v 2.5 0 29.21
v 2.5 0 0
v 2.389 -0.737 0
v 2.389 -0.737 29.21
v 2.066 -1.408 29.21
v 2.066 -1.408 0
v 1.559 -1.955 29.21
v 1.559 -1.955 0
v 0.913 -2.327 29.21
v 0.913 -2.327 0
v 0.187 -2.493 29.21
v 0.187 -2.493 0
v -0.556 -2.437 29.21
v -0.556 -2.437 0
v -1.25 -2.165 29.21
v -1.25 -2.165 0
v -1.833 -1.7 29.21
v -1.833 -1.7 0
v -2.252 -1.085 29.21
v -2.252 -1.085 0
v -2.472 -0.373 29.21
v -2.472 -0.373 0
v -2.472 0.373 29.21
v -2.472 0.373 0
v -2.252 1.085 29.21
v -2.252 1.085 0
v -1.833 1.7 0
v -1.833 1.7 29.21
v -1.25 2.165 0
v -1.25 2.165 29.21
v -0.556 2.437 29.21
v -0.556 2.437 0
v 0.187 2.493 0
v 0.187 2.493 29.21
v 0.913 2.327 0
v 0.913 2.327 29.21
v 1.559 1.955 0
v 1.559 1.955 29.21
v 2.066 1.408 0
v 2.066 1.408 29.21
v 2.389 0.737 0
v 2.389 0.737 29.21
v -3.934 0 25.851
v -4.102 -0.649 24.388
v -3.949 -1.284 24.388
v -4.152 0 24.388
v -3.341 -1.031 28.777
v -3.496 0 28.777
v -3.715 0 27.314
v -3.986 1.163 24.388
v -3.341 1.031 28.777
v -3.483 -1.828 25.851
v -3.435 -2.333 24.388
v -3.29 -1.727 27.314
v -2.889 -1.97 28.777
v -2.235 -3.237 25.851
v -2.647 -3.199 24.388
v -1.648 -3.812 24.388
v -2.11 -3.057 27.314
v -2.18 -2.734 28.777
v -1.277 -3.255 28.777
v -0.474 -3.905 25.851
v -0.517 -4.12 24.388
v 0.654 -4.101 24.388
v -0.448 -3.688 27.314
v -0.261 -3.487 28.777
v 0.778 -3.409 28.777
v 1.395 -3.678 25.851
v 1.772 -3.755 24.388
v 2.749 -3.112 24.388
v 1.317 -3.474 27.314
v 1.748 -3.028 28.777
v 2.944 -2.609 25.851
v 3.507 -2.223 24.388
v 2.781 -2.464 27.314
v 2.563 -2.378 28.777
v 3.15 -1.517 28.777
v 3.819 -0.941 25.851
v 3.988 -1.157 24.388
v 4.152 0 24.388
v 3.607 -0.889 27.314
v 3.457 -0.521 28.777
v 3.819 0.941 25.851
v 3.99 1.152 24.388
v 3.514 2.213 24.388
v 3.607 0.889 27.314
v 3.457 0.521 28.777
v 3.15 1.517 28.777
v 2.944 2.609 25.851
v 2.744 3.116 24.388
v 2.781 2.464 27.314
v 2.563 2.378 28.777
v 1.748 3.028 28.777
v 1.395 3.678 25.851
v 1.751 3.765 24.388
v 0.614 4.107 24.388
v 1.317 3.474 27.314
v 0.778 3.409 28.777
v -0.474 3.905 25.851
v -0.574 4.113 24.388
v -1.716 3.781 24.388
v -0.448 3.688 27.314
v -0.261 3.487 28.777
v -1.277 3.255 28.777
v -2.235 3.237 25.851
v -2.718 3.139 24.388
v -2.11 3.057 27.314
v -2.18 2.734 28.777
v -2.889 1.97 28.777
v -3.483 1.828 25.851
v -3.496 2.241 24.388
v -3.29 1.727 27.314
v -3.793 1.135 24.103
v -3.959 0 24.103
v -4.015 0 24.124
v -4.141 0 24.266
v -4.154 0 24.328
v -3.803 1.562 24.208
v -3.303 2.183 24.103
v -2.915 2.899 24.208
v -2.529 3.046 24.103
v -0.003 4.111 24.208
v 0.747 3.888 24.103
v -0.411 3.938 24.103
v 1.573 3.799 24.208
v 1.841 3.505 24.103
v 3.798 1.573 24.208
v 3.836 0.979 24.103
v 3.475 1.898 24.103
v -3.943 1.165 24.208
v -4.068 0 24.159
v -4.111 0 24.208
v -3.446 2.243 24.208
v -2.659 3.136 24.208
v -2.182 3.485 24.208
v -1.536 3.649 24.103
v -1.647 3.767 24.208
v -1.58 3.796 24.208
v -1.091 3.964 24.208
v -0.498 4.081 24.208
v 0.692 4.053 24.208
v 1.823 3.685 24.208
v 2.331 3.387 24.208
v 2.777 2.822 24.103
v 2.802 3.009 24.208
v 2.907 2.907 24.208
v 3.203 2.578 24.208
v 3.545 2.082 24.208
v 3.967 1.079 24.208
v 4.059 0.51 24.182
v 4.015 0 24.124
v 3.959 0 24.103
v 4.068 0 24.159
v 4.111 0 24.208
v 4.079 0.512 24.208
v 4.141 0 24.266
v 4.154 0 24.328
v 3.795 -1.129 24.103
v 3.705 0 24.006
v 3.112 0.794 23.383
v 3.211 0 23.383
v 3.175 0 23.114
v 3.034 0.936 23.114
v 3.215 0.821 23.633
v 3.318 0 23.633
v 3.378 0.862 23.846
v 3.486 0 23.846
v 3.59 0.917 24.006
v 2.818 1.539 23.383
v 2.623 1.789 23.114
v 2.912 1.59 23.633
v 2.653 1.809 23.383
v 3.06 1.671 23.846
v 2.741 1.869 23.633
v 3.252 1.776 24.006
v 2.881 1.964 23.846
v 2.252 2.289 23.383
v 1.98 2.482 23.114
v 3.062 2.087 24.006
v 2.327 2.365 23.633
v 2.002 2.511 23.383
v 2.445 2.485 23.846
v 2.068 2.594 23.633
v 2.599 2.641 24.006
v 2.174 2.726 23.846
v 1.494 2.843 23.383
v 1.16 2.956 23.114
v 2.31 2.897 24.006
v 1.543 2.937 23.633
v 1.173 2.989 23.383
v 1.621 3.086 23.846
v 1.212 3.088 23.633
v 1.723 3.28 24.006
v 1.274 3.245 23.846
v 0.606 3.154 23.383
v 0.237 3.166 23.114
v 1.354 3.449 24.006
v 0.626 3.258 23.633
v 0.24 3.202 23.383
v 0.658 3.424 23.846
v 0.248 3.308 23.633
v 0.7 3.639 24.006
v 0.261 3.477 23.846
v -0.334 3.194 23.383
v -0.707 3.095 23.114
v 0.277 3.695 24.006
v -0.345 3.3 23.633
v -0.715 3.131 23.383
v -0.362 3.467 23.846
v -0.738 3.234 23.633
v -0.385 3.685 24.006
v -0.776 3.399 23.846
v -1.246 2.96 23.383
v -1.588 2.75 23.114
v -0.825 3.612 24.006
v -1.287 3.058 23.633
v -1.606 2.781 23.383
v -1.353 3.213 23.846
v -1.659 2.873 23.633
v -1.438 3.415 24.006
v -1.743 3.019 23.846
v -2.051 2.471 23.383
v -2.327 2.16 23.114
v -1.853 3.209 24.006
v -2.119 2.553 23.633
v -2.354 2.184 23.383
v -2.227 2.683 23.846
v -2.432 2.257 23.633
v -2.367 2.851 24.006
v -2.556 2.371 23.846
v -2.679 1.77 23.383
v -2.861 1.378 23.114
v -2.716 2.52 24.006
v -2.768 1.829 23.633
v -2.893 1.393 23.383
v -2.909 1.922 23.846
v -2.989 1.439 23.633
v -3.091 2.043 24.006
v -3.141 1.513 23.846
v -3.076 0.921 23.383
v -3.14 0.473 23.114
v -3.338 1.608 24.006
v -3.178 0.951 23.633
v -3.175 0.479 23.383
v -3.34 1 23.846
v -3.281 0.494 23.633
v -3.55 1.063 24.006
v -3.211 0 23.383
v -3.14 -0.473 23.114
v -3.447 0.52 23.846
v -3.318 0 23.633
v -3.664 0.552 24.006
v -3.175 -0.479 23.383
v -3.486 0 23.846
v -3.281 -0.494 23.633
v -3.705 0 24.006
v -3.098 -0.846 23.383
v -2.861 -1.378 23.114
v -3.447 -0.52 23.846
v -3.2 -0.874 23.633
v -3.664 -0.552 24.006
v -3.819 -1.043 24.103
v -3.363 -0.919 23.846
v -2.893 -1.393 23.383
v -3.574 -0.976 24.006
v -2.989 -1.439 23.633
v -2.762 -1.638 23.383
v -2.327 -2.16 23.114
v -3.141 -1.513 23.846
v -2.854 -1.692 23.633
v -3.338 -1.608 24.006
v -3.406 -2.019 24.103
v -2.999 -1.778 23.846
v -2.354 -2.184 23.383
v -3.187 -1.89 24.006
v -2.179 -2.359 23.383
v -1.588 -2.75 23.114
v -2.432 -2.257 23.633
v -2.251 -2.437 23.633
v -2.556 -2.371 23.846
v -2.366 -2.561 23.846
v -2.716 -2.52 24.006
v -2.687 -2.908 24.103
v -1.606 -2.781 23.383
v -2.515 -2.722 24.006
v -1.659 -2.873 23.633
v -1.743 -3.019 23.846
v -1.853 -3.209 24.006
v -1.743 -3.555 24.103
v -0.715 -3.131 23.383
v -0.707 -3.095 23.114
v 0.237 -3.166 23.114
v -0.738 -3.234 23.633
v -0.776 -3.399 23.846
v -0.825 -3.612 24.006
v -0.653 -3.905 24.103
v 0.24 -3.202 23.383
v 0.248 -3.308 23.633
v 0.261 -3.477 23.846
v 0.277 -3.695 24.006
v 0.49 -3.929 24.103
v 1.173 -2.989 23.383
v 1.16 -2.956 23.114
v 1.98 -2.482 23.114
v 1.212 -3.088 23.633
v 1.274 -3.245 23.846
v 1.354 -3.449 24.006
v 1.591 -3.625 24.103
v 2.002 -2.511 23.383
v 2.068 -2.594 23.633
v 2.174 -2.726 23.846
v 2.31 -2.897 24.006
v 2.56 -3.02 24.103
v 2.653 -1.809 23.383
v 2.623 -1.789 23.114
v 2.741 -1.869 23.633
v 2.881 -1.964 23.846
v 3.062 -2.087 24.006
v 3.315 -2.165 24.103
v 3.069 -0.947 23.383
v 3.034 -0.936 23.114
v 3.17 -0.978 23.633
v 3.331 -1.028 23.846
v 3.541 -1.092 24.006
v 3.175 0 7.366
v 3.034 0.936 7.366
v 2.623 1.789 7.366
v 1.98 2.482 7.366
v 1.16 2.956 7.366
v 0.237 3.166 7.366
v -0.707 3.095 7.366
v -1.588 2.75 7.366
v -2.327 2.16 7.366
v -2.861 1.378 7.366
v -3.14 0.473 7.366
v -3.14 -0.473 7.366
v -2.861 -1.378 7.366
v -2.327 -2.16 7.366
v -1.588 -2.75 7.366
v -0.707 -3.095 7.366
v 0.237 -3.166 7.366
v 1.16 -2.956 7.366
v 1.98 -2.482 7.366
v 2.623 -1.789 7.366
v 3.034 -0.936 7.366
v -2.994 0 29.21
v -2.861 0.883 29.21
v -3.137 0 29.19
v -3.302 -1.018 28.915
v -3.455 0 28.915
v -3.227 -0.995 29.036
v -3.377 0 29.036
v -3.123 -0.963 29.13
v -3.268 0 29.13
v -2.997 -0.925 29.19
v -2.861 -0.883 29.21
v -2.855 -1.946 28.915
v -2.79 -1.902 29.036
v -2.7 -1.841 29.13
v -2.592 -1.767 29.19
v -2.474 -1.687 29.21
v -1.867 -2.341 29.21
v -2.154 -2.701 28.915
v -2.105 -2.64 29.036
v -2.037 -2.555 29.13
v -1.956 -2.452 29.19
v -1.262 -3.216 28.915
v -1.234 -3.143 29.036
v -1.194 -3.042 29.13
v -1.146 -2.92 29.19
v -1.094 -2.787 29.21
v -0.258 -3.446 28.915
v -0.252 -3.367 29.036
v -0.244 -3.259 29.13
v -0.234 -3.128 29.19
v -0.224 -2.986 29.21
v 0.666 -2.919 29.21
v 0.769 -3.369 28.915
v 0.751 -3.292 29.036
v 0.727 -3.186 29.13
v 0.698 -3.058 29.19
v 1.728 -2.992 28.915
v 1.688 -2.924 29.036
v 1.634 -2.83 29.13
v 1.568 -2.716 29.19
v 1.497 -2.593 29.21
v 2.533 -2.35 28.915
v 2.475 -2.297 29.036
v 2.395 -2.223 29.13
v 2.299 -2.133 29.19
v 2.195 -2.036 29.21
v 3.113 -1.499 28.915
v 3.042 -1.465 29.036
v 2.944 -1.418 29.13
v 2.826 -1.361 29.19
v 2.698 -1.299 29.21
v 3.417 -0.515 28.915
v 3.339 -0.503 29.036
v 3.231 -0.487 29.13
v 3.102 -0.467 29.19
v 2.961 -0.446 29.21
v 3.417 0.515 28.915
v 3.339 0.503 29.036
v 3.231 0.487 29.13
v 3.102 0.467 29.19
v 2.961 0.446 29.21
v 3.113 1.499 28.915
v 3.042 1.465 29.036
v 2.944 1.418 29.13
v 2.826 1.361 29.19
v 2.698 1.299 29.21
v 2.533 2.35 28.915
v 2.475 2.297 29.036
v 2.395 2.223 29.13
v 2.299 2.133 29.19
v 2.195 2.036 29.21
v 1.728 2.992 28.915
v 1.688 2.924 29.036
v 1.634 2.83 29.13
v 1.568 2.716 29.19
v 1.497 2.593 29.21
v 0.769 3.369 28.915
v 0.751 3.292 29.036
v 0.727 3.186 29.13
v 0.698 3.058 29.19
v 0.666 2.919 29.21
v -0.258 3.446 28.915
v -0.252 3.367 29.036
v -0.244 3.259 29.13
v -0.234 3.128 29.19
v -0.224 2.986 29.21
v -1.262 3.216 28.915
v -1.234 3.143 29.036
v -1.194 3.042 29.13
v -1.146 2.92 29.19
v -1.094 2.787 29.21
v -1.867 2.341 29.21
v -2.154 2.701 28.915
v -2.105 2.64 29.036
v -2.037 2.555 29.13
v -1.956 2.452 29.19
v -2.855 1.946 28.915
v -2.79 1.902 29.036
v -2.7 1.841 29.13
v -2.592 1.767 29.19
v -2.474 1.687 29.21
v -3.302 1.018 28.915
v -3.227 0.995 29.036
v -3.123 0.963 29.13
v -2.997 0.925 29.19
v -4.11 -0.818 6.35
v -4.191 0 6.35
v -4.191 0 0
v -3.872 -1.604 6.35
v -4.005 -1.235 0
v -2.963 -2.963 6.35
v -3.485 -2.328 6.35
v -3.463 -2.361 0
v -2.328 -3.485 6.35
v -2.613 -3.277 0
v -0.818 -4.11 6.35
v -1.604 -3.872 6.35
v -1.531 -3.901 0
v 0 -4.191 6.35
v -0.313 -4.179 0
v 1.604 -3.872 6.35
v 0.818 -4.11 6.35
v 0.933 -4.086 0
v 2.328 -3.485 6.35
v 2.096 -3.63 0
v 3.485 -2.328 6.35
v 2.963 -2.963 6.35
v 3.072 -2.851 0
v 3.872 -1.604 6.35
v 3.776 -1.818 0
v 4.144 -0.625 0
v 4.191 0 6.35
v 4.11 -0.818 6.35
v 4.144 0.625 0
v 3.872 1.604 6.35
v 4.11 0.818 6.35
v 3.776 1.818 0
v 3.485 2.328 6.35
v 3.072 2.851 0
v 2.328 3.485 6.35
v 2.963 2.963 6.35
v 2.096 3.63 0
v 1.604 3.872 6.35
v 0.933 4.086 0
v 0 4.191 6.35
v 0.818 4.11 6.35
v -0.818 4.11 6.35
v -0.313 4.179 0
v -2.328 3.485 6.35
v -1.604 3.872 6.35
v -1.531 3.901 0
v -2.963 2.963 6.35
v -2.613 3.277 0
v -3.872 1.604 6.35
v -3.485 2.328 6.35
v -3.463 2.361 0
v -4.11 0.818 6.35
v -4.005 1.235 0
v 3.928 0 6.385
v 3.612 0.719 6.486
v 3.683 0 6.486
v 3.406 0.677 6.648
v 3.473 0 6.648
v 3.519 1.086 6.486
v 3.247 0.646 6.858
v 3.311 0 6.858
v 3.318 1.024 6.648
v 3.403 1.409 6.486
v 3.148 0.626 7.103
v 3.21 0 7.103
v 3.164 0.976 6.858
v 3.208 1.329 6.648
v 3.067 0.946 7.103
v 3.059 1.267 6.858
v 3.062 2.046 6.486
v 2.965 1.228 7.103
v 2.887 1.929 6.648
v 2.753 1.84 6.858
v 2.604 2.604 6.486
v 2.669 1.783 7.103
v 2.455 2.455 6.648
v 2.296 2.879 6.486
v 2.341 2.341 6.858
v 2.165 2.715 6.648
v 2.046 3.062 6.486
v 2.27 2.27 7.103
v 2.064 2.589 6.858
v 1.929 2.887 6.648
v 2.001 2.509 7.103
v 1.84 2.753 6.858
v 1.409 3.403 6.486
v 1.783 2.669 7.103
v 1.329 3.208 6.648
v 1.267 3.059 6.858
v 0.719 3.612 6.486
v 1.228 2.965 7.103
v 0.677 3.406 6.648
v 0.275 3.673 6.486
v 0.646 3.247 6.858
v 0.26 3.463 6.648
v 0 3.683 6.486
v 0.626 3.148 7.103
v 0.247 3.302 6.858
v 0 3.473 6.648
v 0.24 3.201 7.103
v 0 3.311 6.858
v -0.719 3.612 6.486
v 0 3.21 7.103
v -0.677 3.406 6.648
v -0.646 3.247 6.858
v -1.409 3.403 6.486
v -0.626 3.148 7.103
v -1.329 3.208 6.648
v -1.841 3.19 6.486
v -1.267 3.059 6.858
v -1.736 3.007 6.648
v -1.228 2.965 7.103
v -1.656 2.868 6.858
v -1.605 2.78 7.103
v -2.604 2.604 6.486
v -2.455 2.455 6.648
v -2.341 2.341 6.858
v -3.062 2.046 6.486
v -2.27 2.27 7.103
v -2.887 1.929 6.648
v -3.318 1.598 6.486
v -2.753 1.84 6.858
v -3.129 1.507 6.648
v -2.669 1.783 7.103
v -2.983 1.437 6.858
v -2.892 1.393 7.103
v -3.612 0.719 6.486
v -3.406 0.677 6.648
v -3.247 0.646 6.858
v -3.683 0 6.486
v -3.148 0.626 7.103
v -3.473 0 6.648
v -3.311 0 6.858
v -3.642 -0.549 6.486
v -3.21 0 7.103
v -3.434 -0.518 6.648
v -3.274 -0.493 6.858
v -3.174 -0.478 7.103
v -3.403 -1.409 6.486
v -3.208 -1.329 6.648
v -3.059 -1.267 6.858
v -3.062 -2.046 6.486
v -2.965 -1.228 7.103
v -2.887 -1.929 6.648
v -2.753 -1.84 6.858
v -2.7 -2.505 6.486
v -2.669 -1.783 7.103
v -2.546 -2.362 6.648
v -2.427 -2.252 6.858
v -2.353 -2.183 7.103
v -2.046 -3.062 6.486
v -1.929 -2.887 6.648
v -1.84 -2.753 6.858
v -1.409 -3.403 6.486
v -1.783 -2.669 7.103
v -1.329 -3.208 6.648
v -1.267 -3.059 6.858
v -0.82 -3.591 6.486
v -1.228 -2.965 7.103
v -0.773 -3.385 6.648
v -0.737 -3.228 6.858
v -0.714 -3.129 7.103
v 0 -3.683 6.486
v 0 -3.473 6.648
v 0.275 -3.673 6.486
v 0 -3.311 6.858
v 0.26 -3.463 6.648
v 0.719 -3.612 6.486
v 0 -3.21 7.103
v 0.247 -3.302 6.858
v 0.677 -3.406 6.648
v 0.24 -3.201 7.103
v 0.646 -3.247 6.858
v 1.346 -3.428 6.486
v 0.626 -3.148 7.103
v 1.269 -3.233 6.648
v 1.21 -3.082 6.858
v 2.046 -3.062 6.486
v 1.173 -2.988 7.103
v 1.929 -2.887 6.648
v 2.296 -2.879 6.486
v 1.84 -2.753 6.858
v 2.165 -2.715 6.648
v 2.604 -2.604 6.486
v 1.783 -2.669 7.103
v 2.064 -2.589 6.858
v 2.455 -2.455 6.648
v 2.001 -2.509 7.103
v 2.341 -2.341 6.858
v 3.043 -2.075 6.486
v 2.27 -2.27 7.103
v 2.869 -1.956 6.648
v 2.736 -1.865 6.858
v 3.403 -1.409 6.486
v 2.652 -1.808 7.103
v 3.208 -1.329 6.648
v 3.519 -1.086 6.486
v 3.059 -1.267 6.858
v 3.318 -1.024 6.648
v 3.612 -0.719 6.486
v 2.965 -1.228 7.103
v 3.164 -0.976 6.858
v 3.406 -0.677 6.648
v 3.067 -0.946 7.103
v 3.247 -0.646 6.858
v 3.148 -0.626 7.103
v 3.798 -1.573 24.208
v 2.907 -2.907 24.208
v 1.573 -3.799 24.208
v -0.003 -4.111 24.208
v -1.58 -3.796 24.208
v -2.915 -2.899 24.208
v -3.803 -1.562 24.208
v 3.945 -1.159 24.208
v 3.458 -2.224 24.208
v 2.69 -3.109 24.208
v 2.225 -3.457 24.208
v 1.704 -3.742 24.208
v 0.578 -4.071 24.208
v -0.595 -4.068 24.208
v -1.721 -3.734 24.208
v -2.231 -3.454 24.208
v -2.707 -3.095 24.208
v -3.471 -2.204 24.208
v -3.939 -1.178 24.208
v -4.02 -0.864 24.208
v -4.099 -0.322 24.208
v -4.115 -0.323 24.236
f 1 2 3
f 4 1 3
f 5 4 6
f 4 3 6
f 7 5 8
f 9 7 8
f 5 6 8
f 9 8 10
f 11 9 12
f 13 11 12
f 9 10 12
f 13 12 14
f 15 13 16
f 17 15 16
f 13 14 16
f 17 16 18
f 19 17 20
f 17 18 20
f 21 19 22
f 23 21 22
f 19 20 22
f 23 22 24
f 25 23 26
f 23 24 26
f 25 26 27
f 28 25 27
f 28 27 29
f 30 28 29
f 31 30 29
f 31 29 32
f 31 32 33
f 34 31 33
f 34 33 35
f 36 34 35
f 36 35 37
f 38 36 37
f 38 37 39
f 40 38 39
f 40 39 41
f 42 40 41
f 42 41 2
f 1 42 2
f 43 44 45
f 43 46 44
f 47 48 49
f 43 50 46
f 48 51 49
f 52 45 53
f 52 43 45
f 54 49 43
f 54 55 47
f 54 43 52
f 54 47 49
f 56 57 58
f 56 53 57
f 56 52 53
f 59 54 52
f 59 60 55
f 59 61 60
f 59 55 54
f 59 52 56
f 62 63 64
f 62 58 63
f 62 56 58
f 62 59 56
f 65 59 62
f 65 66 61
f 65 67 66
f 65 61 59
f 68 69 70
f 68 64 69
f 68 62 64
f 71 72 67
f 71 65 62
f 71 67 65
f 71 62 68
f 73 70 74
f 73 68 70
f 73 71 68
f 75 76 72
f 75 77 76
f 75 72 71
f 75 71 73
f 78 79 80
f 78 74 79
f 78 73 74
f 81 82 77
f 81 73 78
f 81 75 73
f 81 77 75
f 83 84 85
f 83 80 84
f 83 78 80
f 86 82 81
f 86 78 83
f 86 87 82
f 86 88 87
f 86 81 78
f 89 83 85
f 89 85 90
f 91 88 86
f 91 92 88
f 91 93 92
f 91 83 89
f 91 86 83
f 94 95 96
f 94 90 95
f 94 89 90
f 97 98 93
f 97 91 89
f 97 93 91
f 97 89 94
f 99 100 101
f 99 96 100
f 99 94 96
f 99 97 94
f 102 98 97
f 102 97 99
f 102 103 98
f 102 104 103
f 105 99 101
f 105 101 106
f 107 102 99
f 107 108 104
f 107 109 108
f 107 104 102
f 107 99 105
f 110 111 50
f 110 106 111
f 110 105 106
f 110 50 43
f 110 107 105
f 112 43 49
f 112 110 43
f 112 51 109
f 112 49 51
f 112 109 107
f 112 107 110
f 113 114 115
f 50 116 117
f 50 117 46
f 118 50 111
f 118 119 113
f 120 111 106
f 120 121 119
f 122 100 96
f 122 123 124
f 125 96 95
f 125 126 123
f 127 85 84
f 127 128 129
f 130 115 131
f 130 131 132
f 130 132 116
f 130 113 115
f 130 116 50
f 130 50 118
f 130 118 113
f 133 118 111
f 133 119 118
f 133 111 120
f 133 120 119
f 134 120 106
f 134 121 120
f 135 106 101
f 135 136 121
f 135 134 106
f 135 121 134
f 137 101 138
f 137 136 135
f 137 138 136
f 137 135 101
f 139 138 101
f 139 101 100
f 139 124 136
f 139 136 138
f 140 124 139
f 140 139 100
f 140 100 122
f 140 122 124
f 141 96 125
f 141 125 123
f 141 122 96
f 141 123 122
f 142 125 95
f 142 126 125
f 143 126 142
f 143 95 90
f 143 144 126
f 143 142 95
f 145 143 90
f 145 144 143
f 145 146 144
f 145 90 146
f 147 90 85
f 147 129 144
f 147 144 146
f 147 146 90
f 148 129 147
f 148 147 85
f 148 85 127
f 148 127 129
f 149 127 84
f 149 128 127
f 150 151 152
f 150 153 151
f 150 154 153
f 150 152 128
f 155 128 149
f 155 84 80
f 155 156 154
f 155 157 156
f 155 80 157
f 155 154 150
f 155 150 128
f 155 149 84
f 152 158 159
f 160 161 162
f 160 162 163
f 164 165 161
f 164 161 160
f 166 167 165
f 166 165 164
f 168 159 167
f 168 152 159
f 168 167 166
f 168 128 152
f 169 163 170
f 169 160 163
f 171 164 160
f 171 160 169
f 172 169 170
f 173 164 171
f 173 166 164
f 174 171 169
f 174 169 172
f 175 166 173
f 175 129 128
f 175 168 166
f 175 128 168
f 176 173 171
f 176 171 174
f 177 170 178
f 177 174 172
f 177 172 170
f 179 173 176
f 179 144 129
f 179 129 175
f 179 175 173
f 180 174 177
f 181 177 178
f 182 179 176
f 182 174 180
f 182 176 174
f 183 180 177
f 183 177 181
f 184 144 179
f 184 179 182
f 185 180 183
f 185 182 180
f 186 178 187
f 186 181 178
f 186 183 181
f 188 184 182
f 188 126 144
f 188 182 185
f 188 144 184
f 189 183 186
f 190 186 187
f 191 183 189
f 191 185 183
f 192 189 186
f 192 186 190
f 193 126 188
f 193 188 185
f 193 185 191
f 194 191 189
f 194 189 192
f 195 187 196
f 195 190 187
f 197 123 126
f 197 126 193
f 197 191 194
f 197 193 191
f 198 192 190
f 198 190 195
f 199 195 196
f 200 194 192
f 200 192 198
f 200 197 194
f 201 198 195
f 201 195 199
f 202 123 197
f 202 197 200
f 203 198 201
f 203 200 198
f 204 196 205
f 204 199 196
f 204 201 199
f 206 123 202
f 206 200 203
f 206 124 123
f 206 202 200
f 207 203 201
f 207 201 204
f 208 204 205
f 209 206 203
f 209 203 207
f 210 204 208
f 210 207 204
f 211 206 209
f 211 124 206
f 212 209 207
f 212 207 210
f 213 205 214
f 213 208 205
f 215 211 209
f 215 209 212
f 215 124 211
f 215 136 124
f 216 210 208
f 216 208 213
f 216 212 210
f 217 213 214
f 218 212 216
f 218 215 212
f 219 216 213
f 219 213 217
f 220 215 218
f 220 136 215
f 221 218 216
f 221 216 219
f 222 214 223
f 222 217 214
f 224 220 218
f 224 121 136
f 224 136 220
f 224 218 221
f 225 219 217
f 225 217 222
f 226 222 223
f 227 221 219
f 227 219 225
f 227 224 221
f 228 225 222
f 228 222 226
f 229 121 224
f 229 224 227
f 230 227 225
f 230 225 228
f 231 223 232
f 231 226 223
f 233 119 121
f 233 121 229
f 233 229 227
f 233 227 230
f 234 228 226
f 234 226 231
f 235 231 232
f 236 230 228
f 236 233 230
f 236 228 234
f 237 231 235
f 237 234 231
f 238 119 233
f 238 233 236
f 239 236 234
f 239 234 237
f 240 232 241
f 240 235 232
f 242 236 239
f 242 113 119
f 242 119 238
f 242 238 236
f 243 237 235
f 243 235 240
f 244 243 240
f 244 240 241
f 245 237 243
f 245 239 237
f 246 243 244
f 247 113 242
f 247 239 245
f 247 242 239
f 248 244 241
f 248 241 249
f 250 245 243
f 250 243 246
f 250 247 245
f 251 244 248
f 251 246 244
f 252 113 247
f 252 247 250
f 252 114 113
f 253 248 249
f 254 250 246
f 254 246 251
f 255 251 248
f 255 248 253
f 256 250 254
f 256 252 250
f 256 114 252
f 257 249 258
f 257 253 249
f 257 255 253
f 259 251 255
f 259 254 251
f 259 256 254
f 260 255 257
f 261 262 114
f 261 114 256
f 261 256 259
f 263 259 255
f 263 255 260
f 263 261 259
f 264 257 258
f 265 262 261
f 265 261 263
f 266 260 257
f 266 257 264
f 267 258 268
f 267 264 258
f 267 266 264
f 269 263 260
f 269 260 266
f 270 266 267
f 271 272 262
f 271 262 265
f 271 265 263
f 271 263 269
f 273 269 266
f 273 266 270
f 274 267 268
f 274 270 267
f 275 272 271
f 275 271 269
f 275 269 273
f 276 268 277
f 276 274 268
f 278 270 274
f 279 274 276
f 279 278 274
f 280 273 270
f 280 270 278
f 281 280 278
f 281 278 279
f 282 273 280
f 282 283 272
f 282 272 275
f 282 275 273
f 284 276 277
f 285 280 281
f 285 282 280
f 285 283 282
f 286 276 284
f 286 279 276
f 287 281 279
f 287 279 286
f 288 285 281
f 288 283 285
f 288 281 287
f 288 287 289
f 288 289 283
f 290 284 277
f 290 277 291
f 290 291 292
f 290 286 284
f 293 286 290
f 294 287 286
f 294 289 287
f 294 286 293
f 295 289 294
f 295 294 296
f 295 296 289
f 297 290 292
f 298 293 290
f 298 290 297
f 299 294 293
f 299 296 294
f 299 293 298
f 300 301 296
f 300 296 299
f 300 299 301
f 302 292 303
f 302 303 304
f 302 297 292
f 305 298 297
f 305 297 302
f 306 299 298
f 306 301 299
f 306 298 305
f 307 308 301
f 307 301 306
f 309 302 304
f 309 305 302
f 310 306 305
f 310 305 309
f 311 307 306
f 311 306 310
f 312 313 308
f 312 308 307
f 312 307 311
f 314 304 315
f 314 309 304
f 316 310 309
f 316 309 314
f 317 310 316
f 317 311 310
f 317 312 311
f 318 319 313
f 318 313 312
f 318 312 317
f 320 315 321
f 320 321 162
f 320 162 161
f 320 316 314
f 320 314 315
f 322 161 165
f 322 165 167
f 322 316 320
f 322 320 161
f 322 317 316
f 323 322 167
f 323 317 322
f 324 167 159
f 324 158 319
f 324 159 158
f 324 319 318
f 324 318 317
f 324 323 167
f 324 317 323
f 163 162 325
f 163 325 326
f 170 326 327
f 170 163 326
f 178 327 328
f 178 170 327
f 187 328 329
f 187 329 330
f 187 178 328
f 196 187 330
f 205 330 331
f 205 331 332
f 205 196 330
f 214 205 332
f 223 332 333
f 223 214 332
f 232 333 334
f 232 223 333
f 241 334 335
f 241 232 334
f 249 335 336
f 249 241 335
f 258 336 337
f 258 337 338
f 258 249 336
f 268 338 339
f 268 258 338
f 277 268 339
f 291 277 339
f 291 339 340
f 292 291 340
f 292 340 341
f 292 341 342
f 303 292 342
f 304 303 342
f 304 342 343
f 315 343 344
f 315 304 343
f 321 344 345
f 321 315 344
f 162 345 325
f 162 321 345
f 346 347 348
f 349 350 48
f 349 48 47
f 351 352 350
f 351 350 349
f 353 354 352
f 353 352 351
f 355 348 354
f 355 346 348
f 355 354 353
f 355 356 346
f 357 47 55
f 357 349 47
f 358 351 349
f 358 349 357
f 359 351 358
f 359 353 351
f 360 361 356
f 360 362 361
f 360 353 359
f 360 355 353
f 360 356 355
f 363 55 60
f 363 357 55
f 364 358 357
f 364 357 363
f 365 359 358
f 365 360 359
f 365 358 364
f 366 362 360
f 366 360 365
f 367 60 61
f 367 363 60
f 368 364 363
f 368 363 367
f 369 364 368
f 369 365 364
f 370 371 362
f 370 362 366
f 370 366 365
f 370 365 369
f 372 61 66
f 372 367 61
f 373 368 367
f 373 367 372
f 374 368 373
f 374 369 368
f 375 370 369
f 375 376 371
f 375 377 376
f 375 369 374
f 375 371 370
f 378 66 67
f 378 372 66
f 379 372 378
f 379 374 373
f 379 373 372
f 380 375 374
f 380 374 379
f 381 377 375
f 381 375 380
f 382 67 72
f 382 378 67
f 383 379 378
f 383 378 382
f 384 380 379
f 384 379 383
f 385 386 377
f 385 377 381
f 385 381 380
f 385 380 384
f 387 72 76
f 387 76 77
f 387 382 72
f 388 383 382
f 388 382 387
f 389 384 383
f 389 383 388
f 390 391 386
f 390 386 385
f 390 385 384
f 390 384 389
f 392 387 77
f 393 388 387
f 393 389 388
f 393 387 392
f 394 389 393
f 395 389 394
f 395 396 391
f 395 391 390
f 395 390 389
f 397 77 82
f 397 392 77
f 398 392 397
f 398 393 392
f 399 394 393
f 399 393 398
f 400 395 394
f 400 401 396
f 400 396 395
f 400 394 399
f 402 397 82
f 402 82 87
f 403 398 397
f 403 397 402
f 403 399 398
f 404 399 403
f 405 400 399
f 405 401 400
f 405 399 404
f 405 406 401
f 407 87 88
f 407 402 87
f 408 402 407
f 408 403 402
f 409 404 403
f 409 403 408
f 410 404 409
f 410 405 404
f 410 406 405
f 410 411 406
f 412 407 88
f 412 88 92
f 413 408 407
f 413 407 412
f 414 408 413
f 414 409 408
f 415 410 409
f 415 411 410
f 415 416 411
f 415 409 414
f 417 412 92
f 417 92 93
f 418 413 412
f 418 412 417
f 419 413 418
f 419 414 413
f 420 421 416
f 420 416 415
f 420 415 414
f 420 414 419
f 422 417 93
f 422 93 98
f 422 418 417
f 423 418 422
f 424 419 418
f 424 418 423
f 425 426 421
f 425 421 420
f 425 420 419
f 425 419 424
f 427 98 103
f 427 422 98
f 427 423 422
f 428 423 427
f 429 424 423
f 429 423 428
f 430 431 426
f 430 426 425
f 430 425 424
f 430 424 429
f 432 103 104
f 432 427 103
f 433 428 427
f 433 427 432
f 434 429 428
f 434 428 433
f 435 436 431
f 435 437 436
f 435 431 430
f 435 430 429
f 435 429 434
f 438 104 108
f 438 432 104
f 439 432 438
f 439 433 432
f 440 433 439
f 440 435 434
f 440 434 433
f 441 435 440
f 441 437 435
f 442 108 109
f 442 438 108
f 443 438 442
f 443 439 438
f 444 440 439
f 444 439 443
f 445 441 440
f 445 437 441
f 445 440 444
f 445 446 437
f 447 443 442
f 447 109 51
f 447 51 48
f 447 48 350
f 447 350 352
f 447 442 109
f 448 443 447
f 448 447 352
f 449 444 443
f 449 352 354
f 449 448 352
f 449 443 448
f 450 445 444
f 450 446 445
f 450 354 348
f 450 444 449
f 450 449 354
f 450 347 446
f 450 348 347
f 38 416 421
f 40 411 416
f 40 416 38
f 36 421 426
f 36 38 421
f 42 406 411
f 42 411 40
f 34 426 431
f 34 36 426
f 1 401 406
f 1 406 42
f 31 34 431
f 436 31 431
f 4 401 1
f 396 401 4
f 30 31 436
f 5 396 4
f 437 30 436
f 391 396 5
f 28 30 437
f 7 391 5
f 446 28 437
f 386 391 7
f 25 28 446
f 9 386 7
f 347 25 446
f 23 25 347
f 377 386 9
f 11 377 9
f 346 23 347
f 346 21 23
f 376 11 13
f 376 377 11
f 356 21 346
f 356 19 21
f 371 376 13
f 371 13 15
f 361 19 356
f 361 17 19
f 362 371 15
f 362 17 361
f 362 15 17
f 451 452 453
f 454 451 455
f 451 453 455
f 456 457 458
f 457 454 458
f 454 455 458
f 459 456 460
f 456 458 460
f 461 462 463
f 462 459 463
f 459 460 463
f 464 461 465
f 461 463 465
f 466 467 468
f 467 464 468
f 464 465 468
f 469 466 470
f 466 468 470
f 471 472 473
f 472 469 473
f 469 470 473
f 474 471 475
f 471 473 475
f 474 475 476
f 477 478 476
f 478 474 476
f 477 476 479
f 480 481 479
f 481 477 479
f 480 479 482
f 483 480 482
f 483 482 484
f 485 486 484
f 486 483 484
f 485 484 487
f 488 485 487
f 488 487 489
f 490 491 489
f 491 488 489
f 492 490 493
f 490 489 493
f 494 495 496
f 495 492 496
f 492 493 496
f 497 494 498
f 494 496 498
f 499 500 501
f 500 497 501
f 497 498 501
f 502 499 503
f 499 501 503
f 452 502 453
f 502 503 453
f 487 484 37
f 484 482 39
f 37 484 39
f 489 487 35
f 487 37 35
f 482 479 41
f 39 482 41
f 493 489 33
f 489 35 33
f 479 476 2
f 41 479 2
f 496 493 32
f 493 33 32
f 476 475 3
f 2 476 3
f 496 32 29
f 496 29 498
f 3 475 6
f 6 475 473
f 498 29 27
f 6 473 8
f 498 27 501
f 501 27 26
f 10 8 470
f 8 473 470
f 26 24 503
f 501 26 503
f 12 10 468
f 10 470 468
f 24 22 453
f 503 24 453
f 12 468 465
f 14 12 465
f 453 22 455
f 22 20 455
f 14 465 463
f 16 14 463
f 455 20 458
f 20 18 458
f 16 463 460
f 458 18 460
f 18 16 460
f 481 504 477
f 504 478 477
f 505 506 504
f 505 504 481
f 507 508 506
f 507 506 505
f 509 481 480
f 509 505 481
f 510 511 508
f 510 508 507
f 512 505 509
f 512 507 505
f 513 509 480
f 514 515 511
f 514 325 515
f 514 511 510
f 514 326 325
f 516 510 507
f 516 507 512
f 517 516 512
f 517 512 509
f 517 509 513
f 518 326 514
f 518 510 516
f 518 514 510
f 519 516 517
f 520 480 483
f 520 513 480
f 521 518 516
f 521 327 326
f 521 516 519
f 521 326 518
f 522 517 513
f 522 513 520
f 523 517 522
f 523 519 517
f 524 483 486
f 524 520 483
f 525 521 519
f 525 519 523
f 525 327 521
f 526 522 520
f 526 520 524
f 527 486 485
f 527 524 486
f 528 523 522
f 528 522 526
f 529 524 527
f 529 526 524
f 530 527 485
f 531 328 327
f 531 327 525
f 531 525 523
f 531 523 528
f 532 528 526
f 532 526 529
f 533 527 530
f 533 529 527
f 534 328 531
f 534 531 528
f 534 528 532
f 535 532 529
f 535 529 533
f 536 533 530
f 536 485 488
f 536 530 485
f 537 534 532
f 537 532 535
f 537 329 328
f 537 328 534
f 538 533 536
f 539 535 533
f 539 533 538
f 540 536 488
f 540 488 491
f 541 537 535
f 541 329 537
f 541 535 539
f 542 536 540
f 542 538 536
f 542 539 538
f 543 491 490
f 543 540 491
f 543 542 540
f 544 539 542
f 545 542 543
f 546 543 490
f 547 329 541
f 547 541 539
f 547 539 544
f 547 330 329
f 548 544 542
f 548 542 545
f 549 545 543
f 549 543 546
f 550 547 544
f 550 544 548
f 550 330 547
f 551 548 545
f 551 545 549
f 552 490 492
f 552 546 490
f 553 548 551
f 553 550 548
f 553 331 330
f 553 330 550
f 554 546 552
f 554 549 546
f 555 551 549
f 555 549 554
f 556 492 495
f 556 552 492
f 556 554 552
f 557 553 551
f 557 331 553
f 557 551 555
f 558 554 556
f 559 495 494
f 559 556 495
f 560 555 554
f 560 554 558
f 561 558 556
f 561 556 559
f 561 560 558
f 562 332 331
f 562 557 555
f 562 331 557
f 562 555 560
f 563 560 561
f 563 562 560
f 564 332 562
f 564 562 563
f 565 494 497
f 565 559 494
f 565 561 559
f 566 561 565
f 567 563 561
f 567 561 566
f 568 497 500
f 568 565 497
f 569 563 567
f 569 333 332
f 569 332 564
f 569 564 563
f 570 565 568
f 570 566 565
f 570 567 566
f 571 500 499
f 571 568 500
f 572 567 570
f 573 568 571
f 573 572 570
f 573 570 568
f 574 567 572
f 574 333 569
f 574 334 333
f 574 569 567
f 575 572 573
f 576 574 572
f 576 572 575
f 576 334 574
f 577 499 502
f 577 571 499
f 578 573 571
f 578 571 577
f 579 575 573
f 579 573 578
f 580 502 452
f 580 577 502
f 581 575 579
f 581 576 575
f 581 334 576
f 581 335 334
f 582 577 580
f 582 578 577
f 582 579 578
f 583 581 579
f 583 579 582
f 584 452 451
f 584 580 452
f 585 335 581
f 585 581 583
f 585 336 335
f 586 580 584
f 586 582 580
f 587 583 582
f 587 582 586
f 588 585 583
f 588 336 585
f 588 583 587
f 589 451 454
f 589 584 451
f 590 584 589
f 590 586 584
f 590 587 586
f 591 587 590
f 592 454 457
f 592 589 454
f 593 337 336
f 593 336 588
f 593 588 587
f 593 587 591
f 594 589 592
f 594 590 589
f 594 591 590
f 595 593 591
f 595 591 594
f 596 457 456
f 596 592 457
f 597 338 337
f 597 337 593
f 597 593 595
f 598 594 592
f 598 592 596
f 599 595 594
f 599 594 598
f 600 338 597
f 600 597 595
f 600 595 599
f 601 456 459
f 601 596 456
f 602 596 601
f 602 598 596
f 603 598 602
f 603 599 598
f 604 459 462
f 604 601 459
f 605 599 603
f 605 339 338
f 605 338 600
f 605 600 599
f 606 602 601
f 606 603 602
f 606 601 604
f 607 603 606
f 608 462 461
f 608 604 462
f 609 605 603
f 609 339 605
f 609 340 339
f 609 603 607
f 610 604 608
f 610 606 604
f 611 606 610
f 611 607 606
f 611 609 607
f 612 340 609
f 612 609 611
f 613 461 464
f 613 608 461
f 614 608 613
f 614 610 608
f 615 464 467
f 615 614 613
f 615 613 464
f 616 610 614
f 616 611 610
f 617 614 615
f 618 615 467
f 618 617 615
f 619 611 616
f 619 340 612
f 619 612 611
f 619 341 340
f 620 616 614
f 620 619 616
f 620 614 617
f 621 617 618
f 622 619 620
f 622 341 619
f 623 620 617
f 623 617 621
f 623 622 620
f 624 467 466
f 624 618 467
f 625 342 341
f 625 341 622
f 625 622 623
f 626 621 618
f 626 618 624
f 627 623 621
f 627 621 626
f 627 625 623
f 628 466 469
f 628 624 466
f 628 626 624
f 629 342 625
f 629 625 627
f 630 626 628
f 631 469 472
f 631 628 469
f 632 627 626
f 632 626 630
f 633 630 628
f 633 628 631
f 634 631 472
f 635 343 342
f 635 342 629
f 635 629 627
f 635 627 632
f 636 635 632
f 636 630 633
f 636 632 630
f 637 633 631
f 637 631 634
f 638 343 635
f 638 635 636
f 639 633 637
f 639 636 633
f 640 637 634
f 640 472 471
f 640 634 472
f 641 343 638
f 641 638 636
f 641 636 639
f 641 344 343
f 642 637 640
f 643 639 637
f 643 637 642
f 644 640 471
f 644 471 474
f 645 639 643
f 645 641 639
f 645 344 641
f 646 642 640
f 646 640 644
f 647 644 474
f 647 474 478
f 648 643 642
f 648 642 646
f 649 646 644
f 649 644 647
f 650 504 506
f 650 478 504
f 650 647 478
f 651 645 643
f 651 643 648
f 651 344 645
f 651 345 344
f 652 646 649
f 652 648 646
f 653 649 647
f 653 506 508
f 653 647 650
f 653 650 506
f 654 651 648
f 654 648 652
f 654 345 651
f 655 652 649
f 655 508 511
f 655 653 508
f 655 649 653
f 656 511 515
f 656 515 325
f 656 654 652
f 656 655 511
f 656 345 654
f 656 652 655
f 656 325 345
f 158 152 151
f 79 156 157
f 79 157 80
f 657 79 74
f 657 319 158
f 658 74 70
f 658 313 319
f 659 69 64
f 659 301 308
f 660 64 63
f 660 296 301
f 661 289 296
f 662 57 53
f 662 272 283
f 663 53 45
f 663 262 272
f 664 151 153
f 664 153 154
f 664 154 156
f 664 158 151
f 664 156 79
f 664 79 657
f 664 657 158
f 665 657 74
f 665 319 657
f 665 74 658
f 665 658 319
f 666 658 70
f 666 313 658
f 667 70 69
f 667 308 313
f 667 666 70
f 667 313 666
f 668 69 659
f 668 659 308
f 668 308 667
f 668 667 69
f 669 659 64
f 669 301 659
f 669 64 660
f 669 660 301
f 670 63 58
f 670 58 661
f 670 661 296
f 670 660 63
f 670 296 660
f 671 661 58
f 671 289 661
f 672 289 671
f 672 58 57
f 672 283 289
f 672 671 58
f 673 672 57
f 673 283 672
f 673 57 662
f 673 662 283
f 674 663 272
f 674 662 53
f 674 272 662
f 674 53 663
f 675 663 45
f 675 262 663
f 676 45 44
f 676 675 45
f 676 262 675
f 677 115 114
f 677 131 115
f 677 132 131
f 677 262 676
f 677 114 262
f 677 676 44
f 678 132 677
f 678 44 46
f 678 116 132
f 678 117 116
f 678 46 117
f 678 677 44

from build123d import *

# Parameters (mm, degrees)
SKETCH1_R           = 4.191
BOSS_EXTRUDE1_DEPTH = 29.21
SKETCH2_R           = 2.5
CUT_EXTRUDE1_START  = -5.08
SKETCH3_R           = 5.08
SKETCH3_R_2         = 3.175
CUT_EXTRUDE1_DEPTH  = 17.78
FILLET1_R           = 1.016
FILLET2_R           = 1.016
CHAMFER1_SIZE       = 5.08
CHAMFER1_SIZE_2     = 0.759211087
FILLET3_R           = 0.254
FILLET4_R           = 0.508


# Some blends are built 0.0001 mm under size
with BuildPart() as part:
    # Sketch1 → Boss-Extrude1 (new body)
    with BuildSketch(Plane.XY):
        with Locations(Location((0, 0, 0), (0, 0, 180))):
            Circle(SKETCH1_R)
    extrude(amount=BOSS_EXTRUDE1_DEPTH)

    # Cut-Sweep1: sweep along a curve in space
    with BuildLine() as cut_sweep1_path:
        Line((0, 0, 29.21), (0, 0, 0))
    # Sketch2 → Cut-Sweep1 (sweep, cut)
    with BuildSketch(Plane.XY.offset(29.21)):
        Circle(SKETCH2_R)
    sweep(path=cut_sweep1_path.line, mode=Mode.SUBTRACT)

    # Sketch3 → Cut-Extrude1 (cut)
    with BuildSketch(Plane.XY.offset(29.21).offset(CUT_EXTRUDE1_START)):
        Circle(SKETCH3_R)
        Circle(SKETCH3_R_2, mode=Mode.SUBTRACT)
    extrude(amount=-CUT_EXTRUDE1_DEPTH, mode=Mode.SUBTRACT)

    # Fillet1
    fillet1_edges = [part.edges().sort_by_distance(p)[0] for p in [
        (-3.175, 0, 6.35),
    ]]
    fillet(fillet1_edges, radius=FILLET1_R - 0.0001)  # a hair under: the kernel refuses the full size

    # Fillet2
    fillet2_edges = [part.edges().sort_by_distance(p)[0] for p in [
        (-3.175, 0, 24.13),
    ]]
    fillet(fillet2_edges, radius=FILLET2_R - 0.0001)  # a hair under: the kernel refuses the full size

    # Chamfer1
    # the kernel refuses this chamfer: 5.08, 0.759211087 mm, written as the material it takes off along each edge
    with BuildSketch(Plane(origin=(0, 0, 29.21), x_dir=(-1, 0, 0), z_dir=(0, 1, 0))) as chamfer1_piece_1:
        Polygon((4.191, -CHAMFER1_SIZE), (4.191 - CHAMFER1_SIZE_2, 0), (4.191, 0), align=None)
    revolve(axis=Axis((0, 0, 29.21), (0, 0, 1)), mode=Mode.SUBTRACT)

    # Fillet3
    fillet3_edges = [part.edges().sort_by_distance(p)[0] for p in [
        (4.191, 0, 24.13),
    ]]
    fillet(fillet3_edges, radius=FILLET3_R)

    # Fillet4
    fillet4_edges = [part.edges().sort_by_distance(p)[0] for p in [
        (3.431788913, 0, 29.21),
    ]]
    fillet(fillet4_edges, radius=FILLET4_R)


solid = part.part
